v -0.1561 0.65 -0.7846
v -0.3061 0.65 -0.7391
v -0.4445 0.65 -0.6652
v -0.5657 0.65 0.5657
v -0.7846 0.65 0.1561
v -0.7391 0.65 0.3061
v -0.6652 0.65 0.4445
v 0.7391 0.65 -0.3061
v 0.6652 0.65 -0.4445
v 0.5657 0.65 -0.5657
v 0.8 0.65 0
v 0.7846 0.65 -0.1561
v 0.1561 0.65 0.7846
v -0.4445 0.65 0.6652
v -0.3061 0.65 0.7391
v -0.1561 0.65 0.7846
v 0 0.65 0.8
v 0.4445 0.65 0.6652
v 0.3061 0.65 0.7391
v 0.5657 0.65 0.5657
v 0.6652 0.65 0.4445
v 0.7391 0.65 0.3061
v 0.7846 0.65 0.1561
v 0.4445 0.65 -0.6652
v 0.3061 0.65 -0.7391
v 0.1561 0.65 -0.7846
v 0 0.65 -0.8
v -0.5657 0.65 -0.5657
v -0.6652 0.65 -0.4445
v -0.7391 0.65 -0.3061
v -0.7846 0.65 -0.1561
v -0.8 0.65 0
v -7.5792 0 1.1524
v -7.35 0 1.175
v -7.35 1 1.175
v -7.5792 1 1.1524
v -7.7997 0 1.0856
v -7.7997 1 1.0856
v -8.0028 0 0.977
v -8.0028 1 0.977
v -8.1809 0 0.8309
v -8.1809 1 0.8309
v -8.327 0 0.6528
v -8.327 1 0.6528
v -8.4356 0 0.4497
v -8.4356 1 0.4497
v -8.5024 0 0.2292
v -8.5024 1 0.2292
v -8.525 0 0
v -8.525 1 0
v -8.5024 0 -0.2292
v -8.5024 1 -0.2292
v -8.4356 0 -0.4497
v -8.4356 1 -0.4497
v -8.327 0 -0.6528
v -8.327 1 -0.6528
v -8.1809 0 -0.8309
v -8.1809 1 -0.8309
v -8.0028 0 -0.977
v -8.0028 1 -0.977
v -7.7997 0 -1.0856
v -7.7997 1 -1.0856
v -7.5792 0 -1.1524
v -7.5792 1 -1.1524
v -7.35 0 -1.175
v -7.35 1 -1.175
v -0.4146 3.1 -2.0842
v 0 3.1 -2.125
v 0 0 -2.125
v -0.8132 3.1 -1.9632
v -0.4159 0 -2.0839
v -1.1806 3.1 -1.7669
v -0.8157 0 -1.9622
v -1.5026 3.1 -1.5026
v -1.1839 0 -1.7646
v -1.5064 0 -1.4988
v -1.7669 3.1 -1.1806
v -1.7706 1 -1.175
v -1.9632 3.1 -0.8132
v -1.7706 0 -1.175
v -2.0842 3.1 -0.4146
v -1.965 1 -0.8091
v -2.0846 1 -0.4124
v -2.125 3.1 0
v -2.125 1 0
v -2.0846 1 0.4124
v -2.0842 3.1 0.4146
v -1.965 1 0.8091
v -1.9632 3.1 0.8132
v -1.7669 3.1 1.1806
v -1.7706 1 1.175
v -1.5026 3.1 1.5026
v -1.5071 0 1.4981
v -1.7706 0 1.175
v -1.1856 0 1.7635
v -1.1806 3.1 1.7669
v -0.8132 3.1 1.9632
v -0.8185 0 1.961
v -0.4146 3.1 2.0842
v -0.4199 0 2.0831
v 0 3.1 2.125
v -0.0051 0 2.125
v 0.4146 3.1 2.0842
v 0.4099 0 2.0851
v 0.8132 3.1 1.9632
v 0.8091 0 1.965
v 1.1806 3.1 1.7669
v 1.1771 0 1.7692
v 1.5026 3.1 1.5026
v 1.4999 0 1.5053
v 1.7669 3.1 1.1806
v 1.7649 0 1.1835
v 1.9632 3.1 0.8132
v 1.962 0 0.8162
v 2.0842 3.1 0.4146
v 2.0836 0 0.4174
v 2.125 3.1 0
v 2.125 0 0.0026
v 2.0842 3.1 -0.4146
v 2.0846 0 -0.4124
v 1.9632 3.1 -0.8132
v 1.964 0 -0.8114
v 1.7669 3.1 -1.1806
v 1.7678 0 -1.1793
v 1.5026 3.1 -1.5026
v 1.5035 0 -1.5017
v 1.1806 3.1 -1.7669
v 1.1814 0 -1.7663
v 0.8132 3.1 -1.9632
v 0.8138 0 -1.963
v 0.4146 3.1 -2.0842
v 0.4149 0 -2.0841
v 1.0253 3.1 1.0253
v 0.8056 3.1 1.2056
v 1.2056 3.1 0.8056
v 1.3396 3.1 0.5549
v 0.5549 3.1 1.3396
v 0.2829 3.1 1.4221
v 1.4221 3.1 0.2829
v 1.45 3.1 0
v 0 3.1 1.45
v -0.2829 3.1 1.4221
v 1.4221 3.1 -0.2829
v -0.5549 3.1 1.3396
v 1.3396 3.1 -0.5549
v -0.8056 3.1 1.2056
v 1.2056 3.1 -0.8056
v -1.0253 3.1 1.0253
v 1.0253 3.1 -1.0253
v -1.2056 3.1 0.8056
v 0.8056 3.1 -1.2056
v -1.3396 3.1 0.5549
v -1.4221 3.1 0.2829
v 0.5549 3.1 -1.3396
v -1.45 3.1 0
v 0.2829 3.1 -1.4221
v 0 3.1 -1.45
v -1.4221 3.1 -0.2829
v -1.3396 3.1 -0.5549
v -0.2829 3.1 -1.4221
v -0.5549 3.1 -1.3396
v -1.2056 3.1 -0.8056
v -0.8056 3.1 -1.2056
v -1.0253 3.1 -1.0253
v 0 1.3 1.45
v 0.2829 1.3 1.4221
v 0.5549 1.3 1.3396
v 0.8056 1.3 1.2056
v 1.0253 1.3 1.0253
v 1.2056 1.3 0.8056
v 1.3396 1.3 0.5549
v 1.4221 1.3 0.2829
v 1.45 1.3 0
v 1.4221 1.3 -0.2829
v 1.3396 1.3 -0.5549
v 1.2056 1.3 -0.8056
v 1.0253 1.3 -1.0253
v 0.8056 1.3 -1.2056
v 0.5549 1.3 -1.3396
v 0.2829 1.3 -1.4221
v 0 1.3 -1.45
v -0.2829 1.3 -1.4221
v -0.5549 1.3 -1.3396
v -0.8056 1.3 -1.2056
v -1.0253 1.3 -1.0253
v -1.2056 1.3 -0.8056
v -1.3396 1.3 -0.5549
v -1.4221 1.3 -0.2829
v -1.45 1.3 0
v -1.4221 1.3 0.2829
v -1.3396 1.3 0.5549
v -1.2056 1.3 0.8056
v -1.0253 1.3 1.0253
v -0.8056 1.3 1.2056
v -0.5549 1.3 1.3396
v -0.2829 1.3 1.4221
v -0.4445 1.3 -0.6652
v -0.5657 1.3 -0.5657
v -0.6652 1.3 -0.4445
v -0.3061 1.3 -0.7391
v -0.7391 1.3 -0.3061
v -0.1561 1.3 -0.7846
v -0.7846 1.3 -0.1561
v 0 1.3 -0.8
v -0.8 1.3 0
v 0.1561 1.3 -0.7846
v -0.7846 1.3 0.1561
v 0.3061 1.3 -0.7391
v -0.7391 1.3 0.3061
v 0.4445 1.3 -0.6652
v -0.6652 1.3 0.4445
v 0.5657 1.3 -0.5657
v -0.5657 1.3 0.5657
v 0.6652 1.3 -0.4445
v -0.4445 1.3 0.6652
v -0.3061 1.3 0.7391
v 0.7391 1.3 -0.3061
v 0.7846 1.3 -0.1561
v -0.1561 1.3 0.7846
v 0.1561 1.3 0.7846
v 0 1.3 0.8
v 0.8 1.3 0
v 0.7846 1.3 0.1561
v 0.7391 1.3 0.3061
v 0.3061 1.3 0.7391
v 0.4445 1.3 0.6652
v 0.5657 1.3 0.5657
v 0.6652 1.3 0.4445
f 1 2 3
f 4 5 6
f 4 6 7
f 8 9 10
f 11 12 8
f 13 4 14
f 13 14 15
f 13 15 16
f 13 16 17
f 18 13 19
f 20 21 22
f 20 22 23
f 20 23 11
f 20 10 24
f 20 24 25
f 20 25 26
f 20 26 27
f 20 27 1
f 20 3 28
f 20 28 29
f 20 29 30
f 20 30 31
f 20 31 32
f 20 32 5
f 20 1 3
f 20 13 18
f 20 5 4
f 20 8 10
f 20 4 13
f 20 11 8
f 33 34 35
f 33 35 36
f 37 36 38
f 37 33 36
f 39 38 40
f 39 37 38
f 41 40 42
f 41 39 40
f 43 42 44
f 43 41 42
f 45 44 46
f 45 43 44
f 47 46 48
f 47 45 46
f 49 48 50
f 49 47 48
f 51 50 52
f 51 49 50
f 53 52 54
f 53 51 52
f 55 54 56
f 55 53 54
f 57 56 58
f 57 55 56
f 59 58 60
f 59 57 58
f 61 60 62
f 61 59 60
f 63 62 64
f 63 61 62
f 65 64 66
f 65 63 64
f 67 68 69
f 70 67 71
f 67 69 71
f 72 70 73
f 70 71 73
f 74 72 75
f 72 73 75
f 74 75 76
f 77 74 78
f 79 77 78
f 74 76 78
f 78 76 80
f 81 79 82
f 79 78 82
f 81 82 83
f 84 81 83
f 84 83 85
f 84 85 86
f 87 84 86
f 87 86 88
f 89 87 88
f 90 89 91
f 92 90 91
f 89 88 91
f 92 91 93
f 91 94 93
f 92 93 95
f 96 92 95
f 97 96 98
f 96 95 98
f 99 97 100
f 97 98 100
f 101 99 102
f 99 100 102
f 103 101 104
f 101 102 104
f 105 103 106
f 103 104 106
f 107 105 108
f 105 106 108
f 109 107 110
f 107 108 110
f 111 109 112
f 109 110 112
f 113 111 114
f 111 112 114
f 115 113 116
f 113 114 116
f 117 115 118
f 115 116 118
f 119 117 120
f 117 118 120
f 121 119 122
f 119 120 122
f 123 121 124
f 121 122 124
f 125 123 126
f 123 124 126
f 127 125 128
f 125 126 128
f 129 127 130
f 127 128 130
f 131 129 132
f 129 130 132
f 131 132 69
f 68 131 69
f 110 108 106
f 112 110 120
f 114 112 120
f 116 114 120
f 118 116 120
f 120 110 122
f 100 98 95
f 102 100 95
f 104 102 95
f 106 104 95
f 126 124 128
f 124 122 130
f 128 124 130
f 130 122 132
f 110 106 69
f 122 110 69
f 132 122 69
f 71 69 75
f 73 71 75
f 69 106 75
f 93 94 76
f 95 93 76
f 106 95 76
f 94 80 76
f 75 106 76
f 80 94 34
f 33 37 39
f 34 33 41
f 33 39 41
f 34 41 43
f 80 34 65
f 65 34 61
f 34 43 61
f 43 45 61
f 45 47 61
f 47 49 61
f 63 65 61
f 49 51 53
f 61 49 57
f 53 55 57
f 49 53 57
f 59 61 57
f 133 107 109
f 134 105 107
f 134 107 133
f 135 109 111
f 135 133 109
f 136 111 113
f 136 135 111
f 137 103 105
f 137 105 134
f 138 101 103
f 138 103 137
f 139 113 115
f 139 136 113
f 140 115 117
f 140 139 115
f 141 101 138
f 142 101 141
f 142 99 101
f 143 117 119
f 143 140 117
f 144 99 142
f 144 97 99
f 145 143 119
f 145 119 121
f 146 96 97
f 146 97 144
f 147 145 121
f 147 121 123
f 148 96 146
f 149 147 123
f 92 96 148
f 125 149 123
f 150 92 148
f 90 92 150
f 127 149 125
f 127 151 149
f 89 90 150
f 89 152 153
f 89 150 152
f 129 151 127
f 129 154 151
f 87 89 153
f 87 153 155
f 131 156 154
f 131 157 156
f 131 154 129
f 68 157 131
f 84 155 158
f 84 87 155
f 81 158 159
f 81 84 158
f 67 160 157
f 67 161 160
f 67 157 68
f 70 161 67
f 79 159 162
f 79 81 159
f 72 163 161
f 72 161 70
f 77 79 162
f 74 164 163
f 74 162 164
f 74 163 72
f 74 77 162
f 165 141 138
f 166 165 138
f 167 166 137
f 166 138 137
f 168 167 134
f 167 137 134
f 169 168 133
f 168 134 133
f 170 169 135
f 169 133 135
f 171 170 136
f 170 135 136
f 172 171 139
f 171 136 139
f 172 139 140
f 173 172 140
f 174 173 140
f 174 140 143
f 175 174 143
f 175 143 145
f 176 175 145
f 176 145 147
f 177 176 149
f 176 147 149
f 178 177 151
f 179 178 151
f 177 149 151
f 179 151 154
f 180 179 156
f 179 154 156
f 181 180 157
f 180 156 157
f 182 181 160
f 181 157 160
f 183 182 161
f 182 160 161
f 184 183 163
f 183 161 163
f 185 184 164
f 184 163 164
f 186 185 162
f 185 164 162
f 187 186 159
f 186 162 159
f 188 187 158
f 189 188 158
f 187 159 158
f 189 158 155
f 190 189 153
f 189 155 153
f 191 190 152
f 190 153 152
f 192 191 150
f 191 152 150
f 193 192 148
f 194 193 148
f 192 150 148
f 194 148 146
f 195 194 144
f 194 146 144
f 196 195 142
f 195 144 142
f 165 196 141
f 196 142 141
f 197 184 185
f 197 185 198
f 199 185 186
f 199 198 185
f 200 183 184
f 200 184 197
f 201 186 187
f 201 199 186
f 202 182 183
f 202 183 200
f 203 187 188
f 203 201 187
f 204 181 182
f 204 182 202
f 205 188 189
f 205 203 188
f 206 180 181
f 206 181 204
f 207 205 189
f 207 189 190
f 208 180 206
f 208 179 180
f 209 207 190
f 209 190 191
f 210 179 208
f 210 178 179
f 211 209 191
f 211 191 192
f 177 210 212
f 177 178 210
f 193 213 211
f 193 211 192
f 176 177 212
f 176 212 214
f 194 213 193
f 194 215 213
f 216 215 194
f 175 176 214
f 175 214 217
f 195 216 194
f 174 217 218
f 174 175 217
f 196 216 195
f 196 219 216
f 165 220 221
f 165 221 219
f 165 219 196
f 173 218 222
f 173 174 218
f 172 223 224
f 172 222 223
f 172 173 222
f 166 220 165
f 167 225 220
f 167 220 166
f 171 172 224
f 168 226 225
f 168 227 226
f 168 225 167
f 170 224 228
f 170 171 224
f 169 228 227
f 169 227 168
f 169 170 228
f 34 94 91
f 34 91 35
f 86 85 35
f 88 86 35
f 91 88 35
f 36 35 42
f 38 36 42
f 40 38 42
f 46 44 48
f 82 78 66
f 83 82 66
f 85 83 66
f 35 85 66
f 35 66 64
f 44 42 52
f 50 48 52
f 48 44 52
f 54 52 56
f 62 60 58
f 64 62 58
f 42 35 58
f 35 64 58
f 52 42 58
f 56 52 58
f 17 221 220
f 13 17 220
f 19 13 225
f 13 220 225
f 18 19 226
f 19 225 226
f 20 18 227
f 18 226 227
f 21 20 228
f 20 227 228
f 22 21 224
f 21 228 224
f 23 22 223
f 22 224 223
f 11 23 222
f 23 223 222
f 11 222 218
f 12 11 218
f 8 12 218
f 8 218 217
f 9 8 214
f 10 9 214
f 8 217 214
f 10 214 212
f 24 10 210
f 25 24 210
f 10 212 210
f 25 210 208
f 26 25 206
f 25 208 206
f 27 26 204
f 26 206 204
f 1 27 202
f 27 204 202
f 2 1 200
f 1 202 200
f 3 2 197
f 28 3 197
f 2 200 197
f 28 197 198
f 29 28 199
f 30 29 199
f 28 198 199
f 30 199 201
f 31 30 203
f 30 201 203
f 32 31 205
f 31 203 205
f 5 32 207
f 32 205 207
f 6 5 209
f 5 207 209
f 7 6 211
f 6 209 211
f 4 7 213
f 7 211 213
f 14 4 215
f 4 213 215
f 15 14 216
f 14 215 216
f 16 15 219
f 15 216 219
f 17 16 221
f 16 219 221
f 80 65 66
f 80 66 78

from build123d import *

# Parameters (mm, degrees)
SKETCH1_R           = 2.125
BOSS_EXTRUDE1_DEPTH = 3.1
SKETCH2_R           = 1.45
CUT_EXTRUDE1_DEPTH  = 1.8
SKETCH3_R           = 0.8
CUT_EXTRUDE2_DEPTH  = 0.65
BOSS_EXTRUDE3_DEPTH = 1


with BuildPart() as part:
    # Sketch1 → Boss-Extrude1 (new body)
    with BuildSketch(Plane(origin=(0, 0, 0), x_dir=(1, 0, 0), z_dir=(0, 1, 0))):
        with Locations(Location((0, 0, 0), (0, 0, 90))):
            Circle(SKETCH1_R)
    extrude(amount=BOSS_EXTRUDE1_DEPTH)

    # Sketch2 → Cut-Extrude1 (cut)
    with BuildSketch(Plane(origin=(0, 3.1, 0), x_dir=(1, 0, 0), z_dir=(0, 1, 0))):
        with Locations(Location((0, 0, 0), (0, 0, 270))):
            Circle(SKETCH2_R)
    extrude(amount=-CUT_EXTRUDE1_DEPTH, mode=Mode.SUBTRACT)

    # Sketch3 → Cut-Extrude2 (cut)
    with BuildSketch(Plane(origin=(0, 1.3, 0), x_dir=(1, 0, 0), z_dir=(0, 1, 0))):
        with Locations(Location((0, 0, 0), (0, 0, 270))):
            Circle(SKETCH3_R)
    extrude(amount=-CUT_EXTRUDE2_DEPTH, mode=Mode.SUBTRACT)

    # Sketch4 → Boss-Extrude3 (add)
    with BuildSketch(Plane(origin=(0, 0, 0), x_dir=(1, 0, 0), z_dir=(0, 1, 0))):
        with BuildLine():
            Line((-1.770593121, -1.175), (-7.35, -1.175))
            ThreePointArc((-7.35, -1.175), (-8.525, 0), (-7.35, 1.175))
            Line((-7.35, 1.175), (-1.770593121, 1.175))
            ThreePointArc((-1.770593121, 1.175), (-2.125, 0), (-1.770593121, -1.175))
        make_face()
    extrude(amount=BOSS_EXTRUDE3_DEPTH)


solid = part.part
